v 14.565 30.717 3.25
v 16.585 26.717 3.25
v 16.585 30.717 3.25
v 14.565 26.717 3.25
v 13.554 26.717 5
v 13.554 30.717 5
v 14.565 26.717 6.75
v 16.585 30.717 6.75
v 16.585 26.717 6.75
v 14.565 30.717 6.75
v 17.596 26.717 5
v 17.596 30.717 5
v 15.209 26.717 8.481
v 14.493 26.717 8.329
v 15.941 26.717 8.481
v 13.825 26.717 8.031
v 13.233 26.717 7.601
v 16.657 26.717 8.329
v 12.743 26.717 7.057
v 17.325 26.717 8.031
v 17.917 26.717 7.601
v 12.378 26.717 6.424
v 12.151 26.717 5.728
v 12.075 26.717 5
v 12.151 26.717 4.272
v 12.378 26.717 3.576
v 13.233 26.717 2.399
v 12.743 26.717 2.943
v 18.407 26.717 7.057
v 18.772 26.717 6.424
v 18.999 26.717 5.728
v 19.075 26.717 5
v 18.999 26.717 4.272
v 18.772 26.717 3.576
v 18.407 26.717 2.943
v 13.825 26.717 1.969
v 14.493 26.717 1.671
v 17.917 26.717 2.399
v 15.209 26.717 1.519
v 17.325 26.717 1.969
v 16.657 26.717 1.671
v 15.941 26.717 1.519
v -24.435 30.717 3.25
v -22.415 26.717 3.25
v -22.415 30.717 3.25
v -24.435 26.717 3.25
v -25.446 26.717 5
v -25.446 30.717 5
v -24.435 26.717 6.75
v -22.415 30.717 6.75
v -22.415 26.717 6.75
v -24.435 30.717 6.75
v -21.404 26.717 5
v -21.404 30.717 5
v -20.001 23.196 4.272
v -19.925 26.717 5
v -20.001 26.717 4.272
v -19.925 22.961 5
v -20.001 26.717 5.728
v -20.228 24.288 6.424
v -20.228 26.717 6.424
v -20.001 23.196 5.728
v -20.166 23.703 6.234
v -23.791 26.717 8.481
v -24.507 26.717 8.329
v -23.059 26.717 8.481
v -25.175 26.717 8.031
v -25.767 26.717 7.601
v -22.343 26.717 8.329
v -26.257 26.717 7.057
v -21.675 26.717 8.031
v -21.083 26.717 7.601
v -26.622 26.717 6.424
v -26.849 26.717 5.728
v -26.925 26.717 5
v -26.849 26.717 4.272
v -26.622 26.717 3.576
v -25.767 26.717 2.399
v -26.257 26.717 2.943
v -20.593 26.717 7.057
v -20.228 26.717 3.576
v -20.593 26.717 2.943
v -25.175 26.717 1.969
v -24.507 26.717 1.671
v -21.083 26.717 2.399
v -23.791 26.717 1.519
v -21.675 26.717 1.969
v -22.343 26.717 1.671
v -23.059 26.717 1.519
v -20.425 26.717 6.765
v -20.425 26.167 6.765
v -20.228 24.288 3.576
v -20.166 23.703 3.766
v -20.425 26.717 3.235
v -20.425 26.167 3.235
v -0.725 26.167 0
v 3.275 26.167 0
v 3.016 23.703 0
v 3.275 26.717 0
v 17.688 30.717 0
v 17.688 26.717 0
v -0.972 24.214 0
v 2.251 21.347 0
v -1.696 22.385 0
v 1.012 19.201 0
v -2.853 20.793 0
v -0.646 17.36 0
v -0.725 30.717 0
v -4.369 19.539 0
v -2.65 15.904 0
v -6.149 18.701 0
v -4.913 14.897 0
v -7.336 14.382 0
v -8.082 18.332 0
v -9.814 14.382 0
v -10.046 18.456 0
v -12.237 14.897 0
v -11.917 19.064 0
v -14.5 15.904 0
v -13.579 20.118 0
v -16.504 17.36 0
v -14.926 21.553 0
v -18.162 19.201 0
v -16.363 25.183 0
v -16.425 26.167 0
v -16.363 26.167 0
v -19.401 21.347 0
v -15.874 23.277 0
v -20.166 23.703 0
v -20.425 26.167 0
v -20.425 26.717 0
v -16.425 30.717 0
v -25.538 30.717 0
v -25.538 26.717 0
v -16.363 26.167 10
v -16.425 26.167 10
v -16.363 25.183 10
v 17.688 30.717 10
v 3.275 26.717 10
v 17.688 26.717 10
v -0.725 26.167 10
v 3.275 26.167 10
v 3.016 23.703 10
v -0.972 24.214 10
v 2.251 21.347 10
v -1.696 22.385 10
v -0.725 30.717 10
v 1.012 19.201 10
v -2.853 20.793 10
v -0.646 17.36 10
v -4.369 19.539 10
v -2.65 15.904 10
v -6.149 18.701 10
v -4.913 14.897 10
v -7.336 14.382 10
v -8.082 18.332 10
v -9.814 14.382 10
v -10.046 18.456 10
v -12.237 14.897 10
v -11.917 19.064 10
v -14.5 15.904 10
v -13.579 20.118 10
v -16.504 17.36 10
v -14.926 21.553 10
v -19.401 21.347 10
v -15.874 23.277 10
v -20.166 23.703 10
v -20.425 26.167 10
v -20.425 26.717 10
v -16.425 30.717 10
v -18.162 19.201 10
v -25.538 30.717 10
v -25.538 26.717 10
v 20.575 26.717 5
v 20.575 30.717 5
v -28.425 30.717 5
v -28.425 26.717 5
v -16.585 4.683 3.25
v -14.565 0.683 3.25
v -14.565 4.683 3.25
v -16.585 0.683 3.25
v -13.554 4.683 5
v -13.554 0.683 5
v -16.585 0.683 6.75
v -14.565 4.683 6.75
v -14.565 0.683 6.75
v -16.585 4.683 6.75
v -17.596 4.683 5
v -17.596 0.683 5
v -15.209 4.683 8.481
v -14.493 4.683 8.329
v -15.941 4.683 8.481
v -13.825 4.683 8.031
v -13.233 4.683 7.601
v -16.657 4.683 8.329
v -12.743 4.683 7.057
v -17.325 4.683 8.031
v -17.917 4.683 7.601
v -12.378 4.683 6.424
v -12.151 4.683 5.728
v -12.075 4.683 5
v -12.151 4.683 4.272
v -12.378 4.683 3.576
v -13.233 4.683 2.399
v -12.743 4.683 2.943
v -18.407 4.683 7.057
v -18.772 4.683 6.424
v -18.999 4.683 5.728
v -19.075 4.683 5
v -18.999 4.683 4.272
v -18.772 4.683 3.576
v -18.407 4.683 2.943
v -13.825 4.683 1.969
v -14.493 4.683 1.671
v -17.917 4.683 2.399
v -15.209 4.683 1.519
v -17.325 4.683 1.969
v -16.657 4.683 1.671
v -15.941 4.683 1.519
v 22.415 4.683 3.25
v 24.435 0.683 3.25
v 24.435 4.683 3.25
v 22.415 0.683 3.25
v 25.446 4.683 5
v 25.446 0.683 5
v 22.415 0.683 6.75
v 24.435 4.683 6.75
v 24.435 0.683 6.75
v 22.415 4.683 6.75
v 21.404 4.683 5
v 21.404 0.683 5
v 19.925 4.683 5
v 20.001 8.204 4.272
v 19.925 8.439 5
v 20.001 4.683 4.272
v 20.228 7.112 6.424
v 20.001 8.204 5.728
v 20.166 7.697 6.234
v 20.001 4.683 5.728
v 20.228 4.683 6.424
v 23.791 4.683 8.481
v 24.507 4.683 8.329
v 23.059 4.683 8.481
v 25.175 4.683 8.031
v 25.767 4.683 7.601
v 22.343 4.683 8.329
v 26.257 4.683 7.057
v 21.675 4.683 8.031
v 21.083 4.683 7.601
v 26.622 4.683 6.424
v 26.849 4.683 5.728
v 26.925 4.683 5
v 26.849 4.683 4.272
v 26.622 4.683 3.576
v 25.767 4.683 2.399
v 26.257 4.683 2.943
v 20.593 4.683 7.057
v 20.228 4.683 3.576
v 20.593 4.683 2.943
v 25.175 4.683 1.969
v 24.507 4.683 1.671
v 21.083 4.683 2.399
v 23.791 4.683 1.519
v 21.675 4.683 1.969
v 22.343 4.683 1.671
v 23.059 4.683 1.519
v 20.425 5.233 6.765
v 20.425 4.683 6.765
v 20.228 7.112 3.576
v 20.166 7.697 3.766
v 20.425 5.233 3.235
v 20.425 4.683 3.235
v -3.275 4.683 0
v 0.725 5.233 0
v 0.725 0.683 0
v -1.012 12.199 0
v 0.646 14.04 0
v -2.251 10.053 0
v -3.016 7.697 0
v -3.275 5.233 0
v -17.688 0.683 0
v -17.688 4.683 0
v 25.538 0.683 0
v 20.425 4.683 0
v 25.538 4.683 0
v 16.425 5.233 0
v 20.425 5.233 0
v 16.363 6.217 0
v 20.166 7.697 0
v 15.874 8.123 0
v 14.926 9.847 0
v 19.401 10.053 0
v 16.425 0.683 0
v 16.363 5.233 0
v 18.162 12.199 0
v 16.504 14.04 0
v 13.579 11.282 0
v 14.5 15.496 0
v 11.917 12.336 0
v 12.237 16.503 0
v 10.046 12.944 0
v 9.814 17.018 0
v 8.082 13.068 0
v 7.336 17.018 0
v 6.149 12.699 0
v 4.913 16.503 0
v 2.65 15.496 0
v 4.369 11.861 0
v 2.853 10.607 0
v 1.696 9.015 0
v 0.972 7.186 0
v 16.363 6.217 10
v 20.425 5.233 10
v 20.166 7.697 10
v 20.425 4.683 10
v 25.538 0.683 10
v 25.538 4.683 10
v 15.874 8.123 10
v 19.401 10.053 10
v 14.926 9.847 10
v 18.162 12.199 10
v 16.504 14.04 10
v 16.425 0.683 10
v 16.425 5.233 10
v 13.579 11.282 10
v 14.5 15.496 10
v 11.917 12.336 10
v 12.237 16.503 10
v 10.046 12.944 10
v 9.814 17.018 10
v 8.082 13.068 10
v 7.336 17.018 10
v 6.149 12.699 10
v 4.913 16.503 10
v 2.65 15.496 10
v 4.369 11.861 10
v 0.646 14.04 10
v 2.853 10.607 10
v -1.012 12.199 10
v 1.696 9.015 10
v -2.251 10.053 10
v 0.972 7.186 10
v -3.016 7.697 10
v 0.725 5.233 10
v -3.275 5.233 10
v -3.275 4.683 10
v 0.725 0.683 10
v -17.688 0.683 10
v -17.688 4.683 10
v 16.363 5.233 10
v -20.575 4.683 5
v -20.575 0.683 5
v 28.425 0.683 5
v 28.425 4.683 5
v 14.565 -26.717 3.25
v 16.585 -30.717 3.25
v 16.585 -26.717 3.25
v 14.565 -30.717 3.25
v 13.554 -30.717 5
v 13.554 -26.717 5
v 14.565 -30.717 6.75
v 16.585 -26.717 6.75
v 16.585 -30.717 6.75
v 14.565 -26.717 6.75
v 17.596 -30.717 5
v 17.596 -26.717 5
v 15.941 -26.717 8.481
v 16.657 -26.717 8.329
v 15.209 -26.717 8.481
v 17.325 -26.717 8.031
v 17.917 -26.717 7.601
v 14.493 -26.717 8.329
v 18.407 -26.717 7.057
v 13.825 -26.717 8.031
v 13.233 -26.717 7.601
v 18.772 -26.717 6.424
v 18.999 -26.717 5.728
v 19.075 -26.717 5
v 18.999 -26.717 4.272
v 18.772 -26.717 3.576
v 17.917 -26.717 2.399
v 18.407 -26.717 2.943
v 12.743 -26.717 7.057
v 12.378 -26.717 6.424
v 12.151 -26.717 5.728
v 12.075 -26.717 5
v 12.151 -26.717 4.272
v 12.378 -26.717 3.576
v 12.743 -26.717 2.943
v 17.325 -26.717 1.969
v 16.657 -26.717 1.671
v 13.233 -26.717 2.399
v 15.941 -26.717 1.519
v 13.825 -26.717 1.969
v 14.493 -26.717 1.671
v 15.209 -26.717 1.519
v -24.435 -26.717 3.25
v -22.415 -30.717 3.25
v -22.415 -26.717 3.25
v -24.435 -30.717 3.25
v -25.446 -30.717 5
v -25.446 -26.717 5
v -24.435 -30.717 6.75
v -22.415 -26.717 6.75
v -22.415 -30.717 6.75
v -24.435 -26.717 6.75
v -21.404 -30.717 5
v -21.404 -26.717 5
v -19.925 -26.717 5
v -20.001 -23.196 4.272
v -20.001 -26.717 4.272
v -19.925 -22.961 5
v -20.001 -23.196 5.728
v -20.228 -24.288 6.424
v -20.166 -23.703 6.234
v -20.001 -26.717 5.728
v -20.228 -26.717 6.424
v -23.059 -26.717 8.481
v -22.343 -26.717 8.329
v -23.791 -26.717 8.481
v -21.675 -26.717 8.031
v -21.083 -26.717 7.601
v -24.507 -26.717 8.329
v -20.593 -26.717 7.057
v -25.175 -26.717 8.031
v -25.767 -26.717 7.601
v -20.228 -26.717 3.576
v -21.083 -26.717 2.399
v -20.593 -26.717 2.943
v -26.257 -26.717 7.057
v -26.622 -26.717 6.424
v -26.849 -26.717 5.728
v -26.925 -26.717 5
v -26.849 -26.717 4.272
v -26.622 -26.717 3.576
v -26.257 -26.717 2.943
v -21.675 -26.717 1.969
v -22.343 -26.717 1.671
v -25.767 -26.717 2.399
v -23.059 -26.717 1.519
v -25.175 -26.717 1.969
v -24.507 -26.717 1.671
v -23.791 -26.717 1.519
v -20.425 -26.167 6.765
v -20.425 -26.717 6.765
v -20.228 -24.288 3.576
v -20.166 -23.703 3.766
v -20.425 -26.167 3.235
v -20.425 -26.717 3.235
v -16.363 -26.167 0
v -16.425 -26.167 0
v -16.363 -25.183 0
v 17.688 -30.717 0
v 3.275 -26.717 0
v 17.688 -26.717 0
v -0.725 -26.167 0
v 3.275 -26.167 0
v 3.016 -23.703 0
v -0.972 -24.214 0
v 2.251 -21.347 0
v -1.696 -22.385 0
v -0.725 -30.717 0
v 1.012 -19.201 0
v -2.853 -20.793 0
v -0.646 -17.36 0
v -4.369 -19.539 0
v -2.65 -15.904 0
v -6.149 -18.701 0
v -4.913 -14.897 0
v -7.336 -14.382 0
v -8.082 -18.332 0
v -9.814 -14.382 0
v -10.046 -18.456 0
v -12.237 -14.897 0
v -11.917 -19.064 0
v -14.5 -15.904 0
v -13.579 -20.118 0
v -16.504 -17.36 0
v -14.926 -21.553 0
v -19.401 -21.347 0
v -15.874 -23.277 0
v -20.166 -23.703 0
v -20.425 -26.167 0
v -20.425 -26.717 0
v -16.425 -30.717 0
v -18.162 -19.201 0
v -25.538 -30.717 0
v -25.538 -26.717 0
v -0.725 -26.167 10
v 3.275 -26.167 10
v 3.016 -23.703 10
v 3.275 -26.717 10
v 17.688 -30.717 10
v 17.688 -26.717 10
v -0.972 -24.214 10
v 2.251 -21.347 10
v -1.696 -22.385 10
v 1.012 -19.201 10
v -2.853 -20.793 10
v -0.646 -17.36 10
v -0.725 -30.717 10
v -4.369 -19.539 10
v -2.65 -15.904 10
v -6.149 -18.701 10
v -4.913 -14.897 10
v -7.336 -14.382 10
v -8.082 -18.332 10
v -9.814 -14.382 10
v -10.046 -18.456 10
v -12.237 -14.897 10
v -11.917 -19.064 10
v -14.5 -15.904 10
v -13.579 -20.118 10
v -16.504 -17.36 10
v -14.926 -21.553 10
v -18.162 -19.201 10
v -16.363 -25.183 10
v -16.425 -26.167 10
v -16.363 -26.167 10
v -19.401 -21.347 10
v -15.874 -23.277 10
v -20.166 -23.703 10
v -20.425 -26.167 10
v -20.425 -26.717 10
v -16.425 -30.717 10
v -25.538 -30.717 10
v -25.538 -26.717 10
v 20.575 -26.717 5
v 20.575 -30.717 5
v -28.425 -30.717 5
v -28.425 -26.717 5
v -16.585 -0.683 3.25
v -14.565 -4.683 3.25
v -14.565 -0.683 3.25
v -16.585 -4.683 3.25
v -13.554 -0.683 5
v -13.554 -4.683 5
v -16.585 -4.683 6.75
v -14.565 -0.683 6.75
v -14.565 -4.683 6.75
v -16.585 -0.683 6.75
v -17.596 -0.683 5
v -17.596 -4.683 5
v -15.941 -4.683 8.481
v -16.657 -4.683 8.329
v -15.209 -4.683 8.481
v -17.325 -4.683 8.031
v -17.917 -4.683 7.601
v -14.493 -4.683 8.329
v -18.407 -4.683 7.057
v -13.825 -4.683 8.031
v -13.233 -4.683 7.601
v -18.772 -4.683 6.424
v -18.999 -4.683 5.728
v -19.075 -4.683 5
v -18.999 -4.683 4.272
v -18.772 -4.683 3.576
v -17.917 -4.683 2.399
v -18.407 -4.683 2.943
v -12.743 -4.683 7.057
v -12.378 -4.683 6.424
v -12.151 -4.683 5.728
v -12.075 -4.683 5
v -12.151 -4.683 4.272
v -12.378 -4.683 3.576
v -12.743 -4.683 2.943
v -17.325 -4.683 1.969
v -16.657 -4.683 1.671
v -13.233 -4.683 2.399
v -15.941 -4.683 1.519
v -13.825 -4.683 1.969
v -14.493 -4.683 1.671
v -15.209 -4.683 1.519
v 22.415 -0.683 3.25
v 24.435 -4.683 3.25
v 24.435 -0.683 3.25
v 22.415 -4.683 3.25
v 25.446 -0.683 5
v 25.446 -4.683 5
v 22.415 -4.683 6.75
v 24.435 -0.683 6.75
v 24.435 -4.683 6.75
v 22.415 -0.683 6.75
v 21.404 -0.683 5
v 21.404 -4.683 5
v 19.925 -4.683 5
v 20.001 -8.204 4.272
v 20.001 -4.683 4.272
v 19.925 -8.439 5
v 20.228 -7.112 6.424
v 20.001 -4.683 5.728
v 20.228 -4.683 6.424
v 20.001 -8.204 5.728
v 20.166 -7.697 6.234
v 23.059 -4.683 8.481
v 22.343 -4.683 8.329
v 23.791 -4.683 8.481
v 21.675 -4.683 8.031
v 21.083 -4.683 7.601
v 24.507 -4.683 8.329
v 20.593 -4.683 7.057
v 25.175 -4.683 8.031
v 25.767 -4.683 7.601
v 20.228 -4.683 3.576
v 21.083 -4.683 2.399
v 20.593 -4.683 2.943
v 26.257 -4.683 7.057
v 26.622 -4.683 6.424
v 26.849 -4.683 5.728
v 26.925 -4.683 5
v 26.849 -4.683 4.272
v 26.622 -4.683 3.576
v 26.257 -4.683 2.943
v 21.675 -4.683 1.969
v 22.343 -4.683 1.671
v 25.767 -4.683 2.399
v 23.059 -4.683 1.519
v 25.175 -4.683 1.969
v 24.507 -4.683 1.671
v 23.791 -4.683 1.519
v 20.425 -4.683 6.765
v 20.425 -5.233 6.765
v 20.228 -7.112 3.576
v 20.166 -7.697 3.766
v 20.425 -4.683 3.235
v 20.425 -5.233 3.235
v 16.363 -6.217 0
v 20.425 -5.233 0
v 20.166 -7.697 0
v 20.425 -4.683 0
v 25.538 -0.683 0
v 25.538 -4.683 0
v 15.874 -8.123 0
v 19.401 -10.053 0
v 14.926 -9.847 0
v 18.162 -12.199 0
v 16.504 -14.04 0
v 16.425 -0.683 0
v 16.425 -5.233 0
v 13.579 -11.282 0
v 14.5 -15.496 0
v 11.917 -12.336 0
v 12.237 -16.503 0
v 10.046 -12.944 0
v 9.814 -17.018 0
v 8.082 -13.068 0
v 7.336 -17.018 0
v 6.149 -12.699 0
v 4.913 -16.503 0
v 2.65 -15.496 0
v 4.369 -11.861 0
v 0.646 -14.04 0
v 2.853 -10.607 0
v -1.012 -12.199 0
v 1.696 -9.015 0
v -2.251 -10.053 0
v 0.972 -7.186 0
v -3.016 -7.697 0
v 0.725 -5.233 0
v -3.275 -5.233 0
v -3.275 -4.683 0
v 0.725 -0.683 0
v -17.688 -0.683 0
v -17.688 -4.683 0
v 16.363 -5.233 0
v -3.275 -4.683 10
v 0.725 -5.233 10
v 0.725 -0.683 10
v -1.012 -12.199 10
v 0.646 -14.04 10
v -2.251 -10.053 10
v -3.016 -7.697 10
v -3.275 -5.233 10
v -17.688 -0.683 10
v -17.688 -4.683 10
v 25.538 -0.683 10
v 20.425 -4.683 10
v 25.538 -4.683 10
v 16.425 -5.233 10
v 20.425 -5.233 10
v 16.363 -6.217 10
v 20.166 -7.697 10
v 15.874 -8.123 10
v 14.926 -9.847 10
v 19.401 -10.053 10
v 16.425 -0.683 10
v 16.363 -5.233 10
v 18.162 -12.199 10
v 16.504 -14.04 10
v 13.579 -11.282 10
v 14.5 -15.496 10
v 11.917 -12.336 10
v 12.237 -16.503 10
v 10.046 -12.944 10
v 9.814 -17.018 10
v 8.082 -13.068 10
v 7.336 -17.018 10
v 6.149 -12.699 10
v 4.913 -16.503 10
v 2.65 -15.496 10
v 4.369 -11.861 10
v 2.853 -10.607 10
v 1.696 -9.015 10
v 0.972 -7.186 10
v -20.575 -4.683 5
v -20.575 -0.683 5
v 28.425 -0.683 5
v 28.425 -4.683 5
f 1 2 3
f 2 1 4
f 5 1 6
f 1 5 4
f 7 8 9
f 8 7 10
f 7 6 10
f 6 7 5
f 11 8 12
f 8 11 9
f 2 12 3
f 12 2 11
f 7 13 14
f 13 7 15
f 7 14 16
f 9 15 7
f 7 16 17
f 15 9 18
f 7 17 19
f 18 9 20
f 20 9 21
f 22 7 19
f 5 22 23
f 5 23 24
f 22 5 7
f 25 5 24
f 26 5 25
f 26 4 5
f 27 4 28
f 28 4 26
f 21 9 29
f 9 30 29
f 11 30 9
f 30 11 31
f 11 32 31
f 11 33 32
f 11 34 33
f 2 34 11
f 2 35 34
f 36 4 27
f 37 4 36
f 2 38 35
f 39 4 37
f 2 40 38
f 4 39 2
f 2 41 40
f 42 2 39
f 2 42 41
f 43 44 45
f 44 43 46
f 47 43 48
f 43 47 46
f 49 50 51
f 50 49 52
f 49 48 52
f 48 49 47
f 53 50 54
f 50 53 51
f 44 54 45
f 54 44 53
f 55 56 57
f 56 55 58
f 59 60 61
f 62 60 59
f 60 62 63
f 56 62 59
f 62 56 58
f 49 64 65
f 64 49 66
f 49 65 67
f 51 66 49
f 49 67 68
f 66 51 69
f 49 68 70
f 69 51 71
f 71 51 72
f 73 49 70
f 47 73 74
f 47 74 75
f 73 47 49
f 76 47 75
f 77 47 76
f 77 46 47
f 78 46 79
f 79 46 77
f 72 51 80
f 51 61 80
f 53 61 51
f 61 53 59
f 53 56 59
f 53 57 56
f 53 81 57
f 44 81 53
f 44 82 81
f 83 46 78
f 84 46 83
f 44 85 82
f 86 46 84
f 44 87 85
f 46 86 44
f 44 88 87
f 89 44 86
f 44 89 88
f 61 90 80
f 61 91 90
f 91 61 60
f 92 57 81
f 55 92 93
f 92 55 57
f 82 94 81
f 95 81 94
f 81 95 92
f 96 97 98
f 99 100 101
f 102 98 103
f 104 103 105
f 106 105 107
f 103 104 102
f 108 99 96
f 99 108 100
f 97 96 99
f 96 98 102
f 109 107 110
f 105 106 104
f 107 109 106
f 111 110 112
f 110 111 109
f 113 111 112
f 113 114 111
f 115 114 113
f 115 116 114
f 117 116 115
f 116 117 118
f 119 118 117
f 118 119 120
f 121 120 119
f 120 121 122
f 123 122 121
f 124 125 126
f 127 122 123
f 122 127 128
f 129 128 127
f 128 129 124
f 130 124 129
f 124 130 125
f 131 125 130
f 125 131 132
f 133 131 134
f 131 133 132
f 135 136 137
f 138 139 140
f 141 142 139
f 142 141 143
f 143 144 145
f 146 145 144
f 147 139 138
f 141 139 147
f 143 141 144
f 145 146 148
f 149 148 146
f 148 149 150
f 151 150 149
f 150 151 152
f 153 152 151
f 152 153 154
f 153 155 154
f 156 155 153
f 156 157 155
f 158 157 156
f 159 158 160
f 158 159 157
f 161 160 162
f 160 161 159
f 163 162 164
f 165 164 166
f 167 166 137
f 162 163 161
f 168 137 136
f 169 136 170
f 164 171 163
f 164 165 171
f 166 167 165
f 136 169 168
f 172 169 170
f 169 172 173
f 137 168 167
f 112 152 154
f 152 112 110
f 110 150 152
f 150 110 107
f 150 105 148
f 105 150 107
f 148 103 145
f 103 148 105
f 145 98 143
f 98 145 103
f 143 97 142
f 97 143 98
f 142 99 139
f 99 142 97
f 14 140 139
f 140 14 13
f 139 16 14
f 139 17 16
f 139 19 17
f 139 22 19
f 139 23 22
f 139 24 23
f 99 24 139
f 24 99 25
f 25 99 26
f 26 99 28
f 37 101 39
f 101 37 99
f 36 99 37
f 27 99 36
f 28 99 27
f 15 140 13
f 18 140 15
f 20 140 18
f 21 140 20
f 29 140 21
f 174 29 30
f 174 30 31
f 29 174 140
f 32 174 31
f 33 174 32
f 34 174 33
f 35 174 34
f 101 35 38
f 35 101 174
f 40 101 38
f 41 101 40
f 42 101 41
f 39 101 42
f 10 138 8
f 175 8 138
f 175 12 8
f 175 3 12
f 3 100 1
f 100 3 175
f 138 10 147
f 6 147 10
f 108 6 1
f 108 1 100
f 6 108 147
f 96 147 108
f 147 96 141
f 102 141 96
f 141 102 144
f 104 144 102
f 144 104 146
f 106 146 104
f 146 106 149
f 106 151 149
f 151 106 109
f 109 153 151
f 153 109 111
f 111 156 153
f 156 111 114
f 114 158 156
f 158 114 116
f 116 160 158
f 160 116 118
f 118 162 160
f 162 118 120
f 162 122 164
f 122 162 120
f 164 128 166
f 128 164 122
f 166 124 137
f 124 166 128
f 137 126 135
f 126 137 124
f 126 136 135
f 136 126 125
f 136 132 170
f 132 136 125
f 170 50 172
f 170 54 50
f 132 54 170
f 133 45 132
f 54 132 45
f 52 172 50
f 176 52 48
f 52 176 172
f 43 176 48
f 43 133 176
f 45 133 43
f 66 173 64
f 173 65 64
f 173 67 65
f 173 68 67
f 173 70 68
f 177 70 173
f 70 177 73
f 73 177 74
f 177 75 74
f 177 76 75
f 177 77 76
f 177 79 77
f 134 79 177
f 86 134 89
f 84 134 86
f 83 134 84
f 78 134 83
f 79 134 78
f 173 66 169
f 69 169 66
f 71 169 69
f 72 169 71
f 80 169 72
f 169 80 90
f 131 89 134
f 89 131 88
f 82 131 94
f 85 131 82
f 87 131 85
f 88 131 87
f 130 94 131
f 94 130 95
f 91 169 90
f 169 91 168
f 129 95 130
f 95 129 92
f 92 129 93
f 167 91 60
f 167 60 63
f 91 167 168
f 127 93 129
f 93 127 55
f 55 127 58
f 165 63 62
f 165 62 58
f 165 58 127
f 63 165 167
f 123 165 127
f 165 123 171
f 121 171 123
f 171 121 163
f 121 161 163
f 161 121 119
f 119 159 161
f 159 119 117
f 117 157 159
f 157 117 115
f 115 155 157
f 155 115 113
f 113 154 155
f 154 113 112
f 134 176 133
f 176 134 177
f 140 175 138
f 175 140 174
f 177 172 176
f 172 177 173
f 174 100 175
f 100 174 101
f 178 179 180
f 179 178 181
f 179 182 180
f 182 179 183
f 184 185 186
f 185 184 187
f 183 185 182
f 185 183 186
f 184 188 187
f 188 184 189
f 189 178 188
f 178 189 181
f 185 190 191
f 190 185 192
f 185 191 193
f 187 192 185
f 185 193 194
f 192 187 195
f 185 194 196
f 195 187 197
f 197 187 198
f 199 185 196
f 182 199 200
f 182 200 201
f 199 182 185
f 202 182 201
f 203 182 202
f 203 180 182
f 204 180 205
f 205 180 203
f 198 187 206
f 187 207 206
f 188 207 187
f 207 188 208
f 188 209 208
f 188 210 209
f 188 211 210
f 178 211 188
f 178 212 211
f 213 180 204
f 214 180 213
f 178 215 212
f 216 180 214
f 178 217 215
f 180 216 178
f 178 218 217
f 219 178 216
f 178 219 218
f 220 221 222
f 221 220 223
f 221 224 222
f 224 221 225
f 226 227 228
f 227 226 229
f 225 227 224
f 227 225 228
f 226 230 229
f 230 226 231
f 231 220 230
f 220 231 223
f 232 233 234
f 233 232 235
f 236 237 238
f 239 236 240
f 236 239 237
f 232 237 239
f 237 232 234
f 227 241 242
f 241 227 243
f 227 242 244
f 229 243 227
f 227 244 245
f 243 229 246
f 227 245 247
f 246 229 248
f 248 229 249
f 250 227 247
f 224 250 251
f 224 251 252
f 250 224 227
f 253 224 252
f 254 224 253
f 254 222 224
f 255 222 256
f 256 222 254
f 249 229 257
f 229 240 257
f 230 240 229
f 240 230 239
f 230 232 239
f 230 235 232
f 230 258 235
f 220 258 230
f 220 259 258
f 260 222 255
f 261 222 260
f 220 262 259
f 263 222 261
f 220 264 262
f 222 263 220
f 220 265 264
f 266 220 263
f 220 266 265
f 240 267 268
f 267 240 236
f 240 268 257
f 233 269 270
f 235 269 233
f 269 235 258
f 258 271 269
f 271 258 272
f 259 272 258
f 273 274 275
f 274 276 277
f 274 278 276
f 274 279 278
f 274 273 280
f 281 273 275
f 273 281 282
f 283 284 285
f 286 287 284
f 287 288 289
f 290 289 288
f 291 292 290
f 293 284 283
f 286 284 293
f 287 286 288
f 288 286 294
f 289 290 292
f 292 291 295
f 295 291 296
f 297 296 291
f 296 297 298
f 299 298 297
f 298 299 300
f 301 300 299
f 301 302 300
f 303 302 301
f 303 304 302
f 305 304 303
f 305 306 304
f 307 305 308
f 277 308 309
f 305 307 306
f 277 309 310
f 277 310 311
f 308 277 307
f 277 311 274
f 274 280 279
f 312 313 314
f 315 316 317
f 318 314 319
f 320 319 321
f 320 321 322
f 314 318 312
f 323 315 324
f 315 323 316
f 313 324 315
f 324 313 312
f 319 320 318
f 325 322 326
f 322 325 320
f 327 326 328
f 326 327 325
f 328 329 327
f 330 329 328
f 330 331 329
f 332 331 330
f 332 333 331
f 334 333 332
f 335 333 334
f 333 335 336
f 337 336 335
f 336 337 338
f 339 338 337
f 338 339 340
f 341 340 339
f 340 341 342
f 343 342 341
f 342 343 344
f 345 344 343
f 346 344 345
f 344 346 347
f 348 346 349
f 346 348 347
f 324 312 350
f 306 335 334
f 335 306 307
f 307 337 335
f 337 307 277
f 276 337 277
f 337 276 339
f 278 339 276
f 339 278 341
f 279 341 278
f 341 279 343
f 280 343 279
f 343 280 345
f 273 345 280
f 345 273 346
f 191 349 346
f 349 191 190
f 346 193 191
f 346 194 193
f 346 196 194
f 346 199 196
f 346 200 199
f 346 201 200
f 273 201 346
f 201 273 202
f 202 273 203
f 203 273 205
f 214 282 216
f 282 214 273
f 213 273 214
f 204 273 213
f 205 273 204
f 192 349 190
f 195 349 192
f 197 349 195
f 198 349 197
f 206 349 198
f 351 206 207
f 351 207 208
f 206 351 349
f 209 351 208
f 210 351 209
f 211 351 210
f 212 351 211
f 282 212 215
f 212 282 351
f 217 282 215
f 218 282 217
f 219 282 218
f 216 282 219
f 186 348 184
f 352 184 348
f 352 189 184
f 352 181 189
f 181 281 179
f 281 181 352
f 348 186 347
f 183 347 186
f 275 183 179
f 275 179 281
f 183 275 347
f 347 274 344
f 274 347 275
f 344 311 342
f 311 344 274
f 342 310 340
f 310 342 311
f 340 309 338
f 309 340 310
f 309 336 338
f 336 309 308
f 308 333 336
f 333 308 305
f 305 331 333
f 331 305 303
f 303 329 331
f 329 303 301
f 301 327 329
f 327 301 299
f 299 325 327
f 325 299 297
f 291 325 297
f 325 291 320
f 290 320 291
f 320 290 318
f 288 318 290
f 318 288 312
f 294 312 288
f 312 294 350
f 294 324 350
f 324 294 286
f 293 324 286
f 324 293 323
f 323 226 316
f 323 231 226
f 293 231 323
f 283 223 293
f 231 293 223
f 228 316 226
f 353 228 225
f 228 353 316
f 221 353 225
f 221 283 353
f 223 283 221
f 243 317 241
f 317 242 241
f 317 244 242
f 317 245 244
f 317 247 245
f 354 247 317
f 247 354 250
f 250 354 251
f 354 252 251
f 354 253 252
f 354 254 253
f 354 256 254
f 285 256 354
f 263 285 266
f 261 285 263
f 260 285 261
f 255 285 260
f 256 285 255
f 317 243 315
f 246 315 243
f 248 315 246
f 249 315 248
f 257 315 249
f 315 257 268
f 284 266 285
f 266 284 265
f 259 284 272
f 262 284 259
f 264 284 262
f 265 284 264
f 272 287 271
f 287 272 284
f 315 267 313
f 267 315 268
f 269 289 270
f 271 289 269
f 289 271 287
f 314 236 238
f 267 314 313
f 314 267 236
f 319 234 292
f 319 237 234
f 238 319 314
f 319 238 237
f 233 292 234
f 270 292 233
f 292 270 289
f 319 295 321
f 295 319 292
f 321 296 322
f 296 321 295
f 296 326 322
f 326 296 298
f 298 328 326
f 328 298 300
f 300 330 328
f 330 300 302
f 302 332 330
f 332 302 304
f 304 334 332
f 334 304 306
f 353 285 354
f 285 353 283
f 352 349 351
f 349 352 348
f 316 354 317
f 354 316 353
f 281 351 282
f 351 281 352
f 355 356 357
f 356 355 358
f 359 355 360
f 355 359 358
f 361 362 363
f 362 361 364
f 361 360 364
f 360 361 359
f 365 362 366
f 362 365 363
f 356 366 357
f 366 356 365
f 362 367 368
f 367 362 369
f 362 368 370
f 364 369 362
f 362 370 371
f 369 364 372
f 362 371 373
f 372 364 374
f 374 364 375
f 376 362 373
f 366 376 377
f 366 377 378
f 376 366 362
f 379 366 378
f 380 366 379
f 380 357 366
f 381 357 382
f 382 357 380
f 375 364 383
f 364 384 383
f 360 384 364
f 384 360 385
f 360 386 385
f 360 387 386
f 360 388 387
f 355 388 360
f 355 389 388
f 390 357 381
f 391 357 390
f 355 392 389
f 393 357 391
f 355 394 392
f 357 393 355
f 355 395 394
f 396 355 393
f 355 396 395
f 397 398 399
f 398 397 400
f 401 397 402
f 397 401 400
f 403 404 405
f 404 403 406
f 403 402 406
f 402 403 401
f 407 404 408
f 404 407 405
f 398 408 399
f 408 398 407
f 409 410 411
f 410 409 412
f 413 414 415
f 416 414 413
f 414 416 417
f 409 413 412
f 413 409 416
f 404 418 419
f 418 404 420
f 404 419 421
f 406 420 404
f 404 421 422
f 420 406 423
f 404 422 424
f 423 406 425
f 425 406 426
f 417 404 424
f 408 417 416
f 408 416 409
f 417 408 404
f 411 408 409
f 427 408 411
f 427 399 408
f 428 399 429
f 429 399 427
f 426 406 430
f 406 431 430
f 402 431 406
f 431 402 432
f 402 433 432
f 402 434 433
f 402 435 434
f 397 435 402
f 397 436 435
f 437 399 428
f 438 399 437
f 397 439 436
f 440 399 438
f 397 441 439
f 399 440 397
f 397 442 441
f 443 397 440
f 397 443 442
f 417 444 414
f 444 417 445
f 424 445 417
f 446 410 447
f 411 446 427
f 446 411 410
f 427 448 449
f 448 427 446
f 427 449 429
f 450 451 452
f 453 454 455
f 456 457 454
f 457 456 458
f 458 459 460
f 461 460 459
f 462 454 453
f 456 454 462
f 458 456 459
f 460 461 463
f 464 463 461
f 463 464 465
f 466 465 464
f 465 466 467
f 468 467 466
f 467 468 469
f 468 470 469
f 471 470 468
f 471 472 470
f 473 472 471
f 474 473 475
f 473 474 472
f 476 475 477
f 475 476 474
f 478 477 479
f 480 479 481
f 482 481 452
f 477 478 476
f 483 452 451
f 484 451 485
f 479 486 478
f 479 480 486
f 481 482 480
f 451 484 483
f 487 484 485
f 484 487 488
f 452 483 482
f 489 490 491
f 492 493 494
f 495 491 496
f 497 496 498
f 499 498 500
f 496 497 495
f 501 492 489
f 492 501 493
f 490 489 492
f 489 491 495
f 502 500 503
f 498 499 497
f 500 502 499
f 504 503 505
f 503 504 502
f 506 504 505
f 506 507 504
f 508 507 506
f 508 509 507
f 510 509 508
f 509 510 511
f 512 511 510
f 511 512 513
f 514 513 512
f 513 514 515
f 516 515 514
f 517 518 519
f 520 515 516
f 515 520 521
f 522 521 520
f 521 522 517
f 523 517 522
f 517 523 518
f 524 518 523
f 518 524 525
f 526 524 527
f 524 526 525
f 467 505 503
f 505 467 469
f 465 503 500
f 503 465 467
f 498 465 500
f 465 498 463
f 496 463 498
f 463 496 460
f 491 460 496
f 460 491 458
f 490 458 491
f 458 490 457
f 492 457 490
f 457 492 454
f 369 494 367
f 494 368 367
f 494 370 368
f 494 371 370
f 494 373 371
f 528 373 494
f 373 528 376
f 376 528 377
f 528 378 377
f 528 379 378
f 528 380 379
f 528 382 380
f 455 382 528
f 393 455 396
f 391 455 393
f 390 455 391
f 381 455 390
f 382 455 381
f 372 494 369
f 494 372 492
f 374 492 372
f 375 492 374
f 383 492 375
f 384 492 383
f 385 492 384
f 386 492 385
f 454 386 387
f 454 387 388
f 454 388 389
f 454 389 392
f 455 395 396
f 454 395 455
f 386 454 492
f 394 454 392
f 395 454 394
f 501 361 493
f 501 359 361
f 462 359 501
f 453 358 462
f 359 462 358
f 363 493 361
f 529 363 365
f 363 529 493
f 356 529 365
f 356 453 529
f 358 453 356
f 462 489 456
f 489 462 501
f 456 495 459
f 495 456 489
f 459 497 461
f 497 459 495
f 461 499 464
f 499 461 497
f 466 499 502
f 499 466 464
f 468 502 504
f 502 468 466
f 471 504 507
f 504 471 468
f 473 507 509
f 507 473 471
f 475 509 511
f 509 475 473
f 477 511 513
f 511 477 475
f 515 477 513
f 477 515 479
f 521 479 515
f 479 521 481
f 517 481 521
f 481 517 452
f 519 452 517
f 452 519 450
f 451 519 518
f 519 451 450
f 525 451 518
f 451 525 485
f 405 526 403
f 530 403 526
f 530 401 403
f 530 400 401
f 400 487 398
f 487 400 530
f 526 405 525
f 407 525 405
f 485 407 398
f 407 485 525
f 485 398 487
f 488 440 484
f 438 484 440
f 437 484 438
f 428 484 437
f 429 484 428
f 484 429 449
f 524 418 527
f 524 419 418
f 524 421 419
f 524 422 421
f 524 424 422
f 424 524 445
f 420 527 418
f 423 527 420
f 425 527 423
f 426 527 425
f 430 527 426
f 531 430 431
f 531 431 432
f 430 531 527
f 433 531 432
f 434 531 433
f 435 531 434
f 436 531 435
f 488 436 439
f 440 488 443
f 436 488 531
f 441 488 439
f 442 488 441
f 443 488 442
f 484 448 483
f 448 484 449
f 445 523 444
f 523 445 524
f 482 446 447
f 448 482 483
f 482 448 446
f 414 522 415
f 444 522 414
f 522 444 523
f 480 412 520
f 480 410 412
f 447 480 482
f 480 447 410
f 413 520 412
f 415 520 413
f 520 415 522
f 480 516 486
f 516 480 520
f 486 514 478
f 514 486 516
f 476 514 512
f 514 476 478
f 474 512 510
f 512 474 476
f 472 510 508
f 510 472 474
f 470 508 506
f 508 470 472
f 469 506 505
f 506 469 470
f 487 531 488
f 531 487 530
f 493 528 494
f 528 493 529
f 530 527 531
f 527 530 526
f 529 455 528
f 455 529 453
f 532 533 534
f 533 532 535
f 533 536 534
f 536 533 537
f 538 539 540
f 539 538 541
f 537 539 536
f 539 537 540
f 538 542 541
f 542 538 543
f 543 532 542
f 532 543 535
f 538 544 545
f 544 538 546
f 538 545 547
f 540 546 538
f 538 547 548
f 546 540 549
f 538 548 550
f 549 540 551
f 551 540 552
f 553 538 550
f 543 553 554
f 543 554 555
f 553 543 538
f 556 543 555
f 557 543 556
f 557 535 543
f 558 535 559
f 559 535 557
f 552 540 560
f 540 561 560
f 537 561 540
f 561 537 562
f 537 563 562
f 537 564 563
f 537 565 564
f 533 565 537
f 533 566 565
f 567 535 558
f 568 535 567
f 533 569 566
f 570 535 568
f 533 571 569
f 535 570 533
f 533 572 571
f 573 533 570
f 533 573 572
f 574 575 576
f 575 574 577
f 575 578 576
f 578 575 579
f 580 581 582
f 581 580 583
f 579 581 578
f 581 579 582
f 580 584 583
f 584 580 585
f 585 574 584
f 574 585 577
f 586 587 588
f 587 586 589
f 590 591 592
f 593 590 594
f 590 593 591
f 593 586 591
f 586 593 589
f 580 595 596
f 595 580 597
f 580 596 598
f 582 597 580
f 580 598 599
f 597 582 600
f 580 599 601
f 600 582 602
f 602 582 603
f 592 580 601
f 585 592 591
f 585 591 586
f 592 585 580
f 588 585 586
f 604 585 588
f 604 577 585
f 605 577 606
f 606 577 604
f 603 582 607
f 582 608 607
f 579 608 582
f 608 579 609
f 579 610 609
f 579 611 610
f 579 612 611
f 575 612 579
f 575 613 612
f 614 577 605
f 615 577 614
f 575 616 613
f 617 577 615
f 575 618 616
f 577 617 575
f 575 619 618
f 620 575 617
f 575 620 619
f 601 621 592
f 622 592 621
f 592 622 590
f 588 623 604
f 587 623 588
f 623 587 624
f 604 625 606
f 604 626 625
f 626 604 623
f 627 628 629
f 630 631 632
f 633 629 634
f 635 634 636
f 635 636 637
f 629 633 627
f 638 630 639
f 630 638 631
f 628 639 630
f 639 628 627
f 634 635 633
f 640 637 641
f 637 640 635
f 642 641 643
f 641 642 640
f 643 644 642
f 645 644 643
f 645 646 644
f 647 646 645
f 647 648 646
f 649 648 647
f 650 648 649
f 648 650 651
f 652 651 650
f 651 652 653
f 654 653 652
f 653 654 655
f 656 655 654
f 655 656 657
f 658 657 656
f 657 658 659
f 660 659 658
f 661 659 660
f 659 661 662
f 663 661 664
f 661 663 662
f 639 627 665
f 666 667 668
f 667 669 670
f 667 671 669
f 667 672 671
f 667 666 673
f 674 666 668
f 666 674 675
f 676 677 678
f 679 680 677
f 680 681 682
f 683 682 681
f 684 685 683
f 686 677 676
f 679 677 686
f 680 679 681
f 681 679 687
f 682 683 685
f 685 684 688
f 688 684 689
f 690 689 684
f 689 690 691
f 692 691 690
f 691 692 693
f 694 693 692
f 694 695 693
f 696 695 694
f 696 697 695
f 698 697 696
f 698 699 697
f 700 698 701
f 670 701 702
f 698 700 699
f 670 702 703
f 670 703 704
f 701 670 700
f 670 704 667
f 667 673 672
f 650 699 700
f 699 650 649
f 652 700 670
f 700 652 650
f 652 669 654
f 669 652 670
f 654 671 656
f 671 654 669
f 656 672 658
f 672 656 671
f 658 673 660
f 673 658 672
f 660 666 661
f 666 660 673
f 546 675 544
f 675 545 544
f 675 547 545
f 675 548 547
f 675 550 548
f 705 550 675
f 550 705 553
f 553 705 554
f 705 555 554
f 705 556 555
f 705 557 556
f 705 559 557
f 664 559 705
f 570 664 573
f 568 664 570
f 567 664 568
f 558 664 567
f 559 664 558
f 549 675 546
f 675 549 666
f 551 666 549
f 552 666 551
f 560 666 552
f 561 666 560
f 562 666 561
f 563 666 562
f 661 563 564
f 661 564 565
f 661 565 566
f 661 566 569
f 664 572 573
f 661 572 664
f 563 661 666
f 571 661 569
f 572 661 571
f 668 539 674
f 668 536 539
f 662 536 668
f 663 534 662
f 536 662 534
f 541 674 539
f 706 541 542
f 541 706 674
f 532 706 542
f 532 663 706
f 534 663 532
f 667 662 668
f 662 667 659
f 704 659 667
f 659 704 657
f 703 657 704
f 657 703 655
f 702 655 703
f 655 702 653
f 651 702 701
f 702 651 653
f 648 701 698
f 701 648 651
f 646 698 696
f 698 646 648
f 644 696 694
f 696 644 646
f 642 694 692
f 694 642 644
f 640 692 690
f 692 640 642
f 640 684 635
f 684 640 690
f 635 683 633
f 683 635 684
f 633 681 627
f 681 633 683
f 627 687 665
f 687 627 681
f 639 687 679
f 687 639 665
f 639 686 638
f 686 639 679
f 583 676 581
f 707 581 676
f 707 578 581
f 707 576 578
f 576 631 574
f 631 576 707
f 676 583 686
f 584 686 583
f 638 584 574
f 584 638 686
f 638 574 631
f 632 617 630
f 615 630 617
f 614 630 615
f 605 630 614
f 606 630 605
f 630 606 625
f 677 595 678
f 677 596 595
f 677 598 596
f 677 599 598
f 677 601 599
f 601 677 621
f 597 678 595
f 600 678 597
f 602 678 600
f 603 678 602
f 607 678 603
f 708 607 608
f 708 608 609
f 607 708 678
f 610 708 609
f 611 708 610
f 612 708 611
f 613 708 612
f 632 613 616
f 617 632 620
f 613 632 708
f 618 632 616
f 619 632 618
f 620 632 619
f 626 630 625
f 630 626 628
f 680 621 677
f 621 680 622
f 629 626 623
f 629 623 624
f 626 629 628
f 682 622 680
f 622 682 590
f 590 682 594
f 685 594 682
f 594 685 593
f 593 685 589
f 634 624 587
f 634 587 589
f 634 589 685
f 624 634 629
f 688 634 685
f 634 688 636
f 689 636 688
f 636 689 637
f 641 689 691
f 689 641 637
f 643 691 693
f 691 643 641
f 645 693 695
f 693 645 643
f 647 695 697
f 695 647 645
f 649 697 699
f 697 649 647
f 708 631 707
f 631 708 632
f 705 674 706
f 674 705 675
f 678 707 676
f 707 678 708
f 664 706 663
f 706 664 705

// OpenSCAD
// file: settings.scad
rod_size = 9;
rod_nut_size = 15.5; //12 for M6, 15 for M8
bearing_size = 15.7; //12.5 for LM6UU, 15.5 for LM8UU,LM8SUU
bearing_length = 25.5; //19.5 for LM6UU, 17.5 for LM8SUU, 24.5 for LM8UU
yz_motor_distance = 25;
motor_screw_spacing = 31; //26 for NEMA14, 31 for NEMA17
motor_casing = 45; //38 for NEMA14, 45 for NEMA17
end_height = 55; //measure the height of your motor casing and add 4mm. Suggestion: 40 for NEMA14, 55 for NEMA17
bed_mount_height = 16;
//x_rod_spacing = motor_screw_spacing + 3 + rod_size;
x_rod_spacing = 30;
x_carriage_width = 70;
carriage_extruder_offset = 5;
pulley_size = 20;
idler_pulley_width = 10;
gusset_size = 15;
m3_size = 3.5;
m3_nut_size = 7;
// m3 nut height is because tristan doesn't know the height of an m3 nut, it is not implemented everywhere, just on the z stop in base_end_2off.scad
m3_nut_height = 3;
m4_size = 4.5;
motor_shaft_size = 5.5;

z_stop_screw_spacing = 20;
// these may be super unneeded, in which case we can easily do a search and replace. But they may be really useful for prototyping/whatever.
z_stop_mount_x_buffer = 2;
z_stop_mount_y_buffer = 2;
z_stop_mount_z_buffer = 2;
z_stop_side_holes = true;
z_stop_bottom_holes = false;

z_stop_arm_actuator_width = 2;
z_stop_arm_actuator_depth = 8;
z_stop_arm_actuator_height = 60;
z_stop_depth = -30;//this is for the optical endstop, this is the width from where it is mounted to where it is clear for the arm to go through.
z_stop_x_adjust=0;

// printer properties. These settings affect major changes in the structure of the printer.
use_rod_for_x_ends = true; // This makes the holes that clamp the x ends the size for rod. This is good when mounting the optical endstop arm, because it is hard to find bolts long enough to go through the end and the endstop arm. (metric ones at least)

// meta vars, these are set by other vars for ease of reference.
z_mount_width = m3_nut_size+z_stop_screw_spacing+(z_stop_mount_x_buffer*2);
base_z_rod_x_offset = yz_motor_distance / 2 - rod_size;
distance_between_x_end_cylinders = motor_casing / 2 + rod_size;
z_stop_x_offset = base_z_rod_x_offset + distance_between_x_end_cylinders - (z_mount_width/2) + z_stop_x_adjust;
x_end_cylinder_radius = bearing_size / 2 + 3;
x_end_front_face_y_offset = (bearing_size / 2 + 3)/2;//In case it's non obvious, this is for getting the amount the x end cylinders extend past the front face.
x_end_cylinder_protrution_depth = x_end_cylinder_radius - x_end_front_face_y_offset;
z_stop_arm_depth = z_stop_arm_actuator_depth + z_stop_depth + m3_nut_height+(z_stop_mount_y_buffer*2)+(motor_casing + (rod_size*4))/2 - x_end_front_face_y_offset;
z_stop_arm_height = z_stop_arm_actuator_height + x_rod_spacing + 8 + rod_size;
z_stop_arm_x_support_depth = (z_stop_arm_depth - x_end_cylinder_protrution_depth) / 3;

// ratio for converting diameter to apothem
da6 = 1 / cos(180 / 6) / 2;
da8 = 1 / cos(180 / 8) / 2;
// main file
include <settings.scad>;

!for(b = [0:1]) mirror([0, b, 0]) for(a = [-1,1]) translate([a * bearing_size / 4, bearing_size - (bearing_size * 2/3) * a, 0]) rotate(90 + 90 * a) y_bearing_retainer();

module y_bearing_retainer() intersection() {
	difference() {
		linear_extrude(height = 10, convexity = 5) difference() {
			union() {
				intersection() {
					translate([-yz_motor_distance / 2 + bearing_size / 2, 0, 0]) circle(bearing_size / 2 + 4);
					translate([-yz_motor_distance / 2 + bearing_size / 2 - bearing_size / 2 - 4, -bearing_size, 0]) square([bearing_size + 8, bearing_size]);
				}
				translate([-yz_motor_distance / 2 + bearing_size / 2 - bearing_size / 2 - 4, 0, 0]) square([bearing_size + 8, bearing_size * sqrt(2) / 4 - 1]);
				translate([0, bearing_size * sqrt(2) / 4 - 3, 0]) square([yz_motor_distance + motor_casing - motor_screw_spacing + 10, 4], center = true);
			}
			translate([-yz_motor_distance / 2 + bearing_size / 2, 0, 0]) circle(bearing_size / 2);
			translate([-yz_motor_distance / 2 + bearing_size / 2 - bearing_size / 2, 0, 0]) square(bearing_size);
		}
		//screw holes
		for(side = [1, -1]) translate([side * (yz_motor_distance + motor_casing - motor_screw_spacing) / 2, 0, 5]) rotate(90) rotate([90, 0, 90]) {
			cylinder(r = m3_size * da6, h = bearing_size, center = true, $fn = 6);
			translate([0, 0, bearing_size * sqrt(2) / 4 - 5]) rotate([180, 0, 0]) cylinder(r = m3_size, h = bearing_size, $fn = 30);
		}
	}
	translate([0, 0, 5]) rotate(90) rotate([90, 0, 90]) cylinder(r = (yz_motor_distance + motor_casing - motor_screw_spacing + 10) / 2, h = bearing_size + 10, center = true, $fn = 6);
}
